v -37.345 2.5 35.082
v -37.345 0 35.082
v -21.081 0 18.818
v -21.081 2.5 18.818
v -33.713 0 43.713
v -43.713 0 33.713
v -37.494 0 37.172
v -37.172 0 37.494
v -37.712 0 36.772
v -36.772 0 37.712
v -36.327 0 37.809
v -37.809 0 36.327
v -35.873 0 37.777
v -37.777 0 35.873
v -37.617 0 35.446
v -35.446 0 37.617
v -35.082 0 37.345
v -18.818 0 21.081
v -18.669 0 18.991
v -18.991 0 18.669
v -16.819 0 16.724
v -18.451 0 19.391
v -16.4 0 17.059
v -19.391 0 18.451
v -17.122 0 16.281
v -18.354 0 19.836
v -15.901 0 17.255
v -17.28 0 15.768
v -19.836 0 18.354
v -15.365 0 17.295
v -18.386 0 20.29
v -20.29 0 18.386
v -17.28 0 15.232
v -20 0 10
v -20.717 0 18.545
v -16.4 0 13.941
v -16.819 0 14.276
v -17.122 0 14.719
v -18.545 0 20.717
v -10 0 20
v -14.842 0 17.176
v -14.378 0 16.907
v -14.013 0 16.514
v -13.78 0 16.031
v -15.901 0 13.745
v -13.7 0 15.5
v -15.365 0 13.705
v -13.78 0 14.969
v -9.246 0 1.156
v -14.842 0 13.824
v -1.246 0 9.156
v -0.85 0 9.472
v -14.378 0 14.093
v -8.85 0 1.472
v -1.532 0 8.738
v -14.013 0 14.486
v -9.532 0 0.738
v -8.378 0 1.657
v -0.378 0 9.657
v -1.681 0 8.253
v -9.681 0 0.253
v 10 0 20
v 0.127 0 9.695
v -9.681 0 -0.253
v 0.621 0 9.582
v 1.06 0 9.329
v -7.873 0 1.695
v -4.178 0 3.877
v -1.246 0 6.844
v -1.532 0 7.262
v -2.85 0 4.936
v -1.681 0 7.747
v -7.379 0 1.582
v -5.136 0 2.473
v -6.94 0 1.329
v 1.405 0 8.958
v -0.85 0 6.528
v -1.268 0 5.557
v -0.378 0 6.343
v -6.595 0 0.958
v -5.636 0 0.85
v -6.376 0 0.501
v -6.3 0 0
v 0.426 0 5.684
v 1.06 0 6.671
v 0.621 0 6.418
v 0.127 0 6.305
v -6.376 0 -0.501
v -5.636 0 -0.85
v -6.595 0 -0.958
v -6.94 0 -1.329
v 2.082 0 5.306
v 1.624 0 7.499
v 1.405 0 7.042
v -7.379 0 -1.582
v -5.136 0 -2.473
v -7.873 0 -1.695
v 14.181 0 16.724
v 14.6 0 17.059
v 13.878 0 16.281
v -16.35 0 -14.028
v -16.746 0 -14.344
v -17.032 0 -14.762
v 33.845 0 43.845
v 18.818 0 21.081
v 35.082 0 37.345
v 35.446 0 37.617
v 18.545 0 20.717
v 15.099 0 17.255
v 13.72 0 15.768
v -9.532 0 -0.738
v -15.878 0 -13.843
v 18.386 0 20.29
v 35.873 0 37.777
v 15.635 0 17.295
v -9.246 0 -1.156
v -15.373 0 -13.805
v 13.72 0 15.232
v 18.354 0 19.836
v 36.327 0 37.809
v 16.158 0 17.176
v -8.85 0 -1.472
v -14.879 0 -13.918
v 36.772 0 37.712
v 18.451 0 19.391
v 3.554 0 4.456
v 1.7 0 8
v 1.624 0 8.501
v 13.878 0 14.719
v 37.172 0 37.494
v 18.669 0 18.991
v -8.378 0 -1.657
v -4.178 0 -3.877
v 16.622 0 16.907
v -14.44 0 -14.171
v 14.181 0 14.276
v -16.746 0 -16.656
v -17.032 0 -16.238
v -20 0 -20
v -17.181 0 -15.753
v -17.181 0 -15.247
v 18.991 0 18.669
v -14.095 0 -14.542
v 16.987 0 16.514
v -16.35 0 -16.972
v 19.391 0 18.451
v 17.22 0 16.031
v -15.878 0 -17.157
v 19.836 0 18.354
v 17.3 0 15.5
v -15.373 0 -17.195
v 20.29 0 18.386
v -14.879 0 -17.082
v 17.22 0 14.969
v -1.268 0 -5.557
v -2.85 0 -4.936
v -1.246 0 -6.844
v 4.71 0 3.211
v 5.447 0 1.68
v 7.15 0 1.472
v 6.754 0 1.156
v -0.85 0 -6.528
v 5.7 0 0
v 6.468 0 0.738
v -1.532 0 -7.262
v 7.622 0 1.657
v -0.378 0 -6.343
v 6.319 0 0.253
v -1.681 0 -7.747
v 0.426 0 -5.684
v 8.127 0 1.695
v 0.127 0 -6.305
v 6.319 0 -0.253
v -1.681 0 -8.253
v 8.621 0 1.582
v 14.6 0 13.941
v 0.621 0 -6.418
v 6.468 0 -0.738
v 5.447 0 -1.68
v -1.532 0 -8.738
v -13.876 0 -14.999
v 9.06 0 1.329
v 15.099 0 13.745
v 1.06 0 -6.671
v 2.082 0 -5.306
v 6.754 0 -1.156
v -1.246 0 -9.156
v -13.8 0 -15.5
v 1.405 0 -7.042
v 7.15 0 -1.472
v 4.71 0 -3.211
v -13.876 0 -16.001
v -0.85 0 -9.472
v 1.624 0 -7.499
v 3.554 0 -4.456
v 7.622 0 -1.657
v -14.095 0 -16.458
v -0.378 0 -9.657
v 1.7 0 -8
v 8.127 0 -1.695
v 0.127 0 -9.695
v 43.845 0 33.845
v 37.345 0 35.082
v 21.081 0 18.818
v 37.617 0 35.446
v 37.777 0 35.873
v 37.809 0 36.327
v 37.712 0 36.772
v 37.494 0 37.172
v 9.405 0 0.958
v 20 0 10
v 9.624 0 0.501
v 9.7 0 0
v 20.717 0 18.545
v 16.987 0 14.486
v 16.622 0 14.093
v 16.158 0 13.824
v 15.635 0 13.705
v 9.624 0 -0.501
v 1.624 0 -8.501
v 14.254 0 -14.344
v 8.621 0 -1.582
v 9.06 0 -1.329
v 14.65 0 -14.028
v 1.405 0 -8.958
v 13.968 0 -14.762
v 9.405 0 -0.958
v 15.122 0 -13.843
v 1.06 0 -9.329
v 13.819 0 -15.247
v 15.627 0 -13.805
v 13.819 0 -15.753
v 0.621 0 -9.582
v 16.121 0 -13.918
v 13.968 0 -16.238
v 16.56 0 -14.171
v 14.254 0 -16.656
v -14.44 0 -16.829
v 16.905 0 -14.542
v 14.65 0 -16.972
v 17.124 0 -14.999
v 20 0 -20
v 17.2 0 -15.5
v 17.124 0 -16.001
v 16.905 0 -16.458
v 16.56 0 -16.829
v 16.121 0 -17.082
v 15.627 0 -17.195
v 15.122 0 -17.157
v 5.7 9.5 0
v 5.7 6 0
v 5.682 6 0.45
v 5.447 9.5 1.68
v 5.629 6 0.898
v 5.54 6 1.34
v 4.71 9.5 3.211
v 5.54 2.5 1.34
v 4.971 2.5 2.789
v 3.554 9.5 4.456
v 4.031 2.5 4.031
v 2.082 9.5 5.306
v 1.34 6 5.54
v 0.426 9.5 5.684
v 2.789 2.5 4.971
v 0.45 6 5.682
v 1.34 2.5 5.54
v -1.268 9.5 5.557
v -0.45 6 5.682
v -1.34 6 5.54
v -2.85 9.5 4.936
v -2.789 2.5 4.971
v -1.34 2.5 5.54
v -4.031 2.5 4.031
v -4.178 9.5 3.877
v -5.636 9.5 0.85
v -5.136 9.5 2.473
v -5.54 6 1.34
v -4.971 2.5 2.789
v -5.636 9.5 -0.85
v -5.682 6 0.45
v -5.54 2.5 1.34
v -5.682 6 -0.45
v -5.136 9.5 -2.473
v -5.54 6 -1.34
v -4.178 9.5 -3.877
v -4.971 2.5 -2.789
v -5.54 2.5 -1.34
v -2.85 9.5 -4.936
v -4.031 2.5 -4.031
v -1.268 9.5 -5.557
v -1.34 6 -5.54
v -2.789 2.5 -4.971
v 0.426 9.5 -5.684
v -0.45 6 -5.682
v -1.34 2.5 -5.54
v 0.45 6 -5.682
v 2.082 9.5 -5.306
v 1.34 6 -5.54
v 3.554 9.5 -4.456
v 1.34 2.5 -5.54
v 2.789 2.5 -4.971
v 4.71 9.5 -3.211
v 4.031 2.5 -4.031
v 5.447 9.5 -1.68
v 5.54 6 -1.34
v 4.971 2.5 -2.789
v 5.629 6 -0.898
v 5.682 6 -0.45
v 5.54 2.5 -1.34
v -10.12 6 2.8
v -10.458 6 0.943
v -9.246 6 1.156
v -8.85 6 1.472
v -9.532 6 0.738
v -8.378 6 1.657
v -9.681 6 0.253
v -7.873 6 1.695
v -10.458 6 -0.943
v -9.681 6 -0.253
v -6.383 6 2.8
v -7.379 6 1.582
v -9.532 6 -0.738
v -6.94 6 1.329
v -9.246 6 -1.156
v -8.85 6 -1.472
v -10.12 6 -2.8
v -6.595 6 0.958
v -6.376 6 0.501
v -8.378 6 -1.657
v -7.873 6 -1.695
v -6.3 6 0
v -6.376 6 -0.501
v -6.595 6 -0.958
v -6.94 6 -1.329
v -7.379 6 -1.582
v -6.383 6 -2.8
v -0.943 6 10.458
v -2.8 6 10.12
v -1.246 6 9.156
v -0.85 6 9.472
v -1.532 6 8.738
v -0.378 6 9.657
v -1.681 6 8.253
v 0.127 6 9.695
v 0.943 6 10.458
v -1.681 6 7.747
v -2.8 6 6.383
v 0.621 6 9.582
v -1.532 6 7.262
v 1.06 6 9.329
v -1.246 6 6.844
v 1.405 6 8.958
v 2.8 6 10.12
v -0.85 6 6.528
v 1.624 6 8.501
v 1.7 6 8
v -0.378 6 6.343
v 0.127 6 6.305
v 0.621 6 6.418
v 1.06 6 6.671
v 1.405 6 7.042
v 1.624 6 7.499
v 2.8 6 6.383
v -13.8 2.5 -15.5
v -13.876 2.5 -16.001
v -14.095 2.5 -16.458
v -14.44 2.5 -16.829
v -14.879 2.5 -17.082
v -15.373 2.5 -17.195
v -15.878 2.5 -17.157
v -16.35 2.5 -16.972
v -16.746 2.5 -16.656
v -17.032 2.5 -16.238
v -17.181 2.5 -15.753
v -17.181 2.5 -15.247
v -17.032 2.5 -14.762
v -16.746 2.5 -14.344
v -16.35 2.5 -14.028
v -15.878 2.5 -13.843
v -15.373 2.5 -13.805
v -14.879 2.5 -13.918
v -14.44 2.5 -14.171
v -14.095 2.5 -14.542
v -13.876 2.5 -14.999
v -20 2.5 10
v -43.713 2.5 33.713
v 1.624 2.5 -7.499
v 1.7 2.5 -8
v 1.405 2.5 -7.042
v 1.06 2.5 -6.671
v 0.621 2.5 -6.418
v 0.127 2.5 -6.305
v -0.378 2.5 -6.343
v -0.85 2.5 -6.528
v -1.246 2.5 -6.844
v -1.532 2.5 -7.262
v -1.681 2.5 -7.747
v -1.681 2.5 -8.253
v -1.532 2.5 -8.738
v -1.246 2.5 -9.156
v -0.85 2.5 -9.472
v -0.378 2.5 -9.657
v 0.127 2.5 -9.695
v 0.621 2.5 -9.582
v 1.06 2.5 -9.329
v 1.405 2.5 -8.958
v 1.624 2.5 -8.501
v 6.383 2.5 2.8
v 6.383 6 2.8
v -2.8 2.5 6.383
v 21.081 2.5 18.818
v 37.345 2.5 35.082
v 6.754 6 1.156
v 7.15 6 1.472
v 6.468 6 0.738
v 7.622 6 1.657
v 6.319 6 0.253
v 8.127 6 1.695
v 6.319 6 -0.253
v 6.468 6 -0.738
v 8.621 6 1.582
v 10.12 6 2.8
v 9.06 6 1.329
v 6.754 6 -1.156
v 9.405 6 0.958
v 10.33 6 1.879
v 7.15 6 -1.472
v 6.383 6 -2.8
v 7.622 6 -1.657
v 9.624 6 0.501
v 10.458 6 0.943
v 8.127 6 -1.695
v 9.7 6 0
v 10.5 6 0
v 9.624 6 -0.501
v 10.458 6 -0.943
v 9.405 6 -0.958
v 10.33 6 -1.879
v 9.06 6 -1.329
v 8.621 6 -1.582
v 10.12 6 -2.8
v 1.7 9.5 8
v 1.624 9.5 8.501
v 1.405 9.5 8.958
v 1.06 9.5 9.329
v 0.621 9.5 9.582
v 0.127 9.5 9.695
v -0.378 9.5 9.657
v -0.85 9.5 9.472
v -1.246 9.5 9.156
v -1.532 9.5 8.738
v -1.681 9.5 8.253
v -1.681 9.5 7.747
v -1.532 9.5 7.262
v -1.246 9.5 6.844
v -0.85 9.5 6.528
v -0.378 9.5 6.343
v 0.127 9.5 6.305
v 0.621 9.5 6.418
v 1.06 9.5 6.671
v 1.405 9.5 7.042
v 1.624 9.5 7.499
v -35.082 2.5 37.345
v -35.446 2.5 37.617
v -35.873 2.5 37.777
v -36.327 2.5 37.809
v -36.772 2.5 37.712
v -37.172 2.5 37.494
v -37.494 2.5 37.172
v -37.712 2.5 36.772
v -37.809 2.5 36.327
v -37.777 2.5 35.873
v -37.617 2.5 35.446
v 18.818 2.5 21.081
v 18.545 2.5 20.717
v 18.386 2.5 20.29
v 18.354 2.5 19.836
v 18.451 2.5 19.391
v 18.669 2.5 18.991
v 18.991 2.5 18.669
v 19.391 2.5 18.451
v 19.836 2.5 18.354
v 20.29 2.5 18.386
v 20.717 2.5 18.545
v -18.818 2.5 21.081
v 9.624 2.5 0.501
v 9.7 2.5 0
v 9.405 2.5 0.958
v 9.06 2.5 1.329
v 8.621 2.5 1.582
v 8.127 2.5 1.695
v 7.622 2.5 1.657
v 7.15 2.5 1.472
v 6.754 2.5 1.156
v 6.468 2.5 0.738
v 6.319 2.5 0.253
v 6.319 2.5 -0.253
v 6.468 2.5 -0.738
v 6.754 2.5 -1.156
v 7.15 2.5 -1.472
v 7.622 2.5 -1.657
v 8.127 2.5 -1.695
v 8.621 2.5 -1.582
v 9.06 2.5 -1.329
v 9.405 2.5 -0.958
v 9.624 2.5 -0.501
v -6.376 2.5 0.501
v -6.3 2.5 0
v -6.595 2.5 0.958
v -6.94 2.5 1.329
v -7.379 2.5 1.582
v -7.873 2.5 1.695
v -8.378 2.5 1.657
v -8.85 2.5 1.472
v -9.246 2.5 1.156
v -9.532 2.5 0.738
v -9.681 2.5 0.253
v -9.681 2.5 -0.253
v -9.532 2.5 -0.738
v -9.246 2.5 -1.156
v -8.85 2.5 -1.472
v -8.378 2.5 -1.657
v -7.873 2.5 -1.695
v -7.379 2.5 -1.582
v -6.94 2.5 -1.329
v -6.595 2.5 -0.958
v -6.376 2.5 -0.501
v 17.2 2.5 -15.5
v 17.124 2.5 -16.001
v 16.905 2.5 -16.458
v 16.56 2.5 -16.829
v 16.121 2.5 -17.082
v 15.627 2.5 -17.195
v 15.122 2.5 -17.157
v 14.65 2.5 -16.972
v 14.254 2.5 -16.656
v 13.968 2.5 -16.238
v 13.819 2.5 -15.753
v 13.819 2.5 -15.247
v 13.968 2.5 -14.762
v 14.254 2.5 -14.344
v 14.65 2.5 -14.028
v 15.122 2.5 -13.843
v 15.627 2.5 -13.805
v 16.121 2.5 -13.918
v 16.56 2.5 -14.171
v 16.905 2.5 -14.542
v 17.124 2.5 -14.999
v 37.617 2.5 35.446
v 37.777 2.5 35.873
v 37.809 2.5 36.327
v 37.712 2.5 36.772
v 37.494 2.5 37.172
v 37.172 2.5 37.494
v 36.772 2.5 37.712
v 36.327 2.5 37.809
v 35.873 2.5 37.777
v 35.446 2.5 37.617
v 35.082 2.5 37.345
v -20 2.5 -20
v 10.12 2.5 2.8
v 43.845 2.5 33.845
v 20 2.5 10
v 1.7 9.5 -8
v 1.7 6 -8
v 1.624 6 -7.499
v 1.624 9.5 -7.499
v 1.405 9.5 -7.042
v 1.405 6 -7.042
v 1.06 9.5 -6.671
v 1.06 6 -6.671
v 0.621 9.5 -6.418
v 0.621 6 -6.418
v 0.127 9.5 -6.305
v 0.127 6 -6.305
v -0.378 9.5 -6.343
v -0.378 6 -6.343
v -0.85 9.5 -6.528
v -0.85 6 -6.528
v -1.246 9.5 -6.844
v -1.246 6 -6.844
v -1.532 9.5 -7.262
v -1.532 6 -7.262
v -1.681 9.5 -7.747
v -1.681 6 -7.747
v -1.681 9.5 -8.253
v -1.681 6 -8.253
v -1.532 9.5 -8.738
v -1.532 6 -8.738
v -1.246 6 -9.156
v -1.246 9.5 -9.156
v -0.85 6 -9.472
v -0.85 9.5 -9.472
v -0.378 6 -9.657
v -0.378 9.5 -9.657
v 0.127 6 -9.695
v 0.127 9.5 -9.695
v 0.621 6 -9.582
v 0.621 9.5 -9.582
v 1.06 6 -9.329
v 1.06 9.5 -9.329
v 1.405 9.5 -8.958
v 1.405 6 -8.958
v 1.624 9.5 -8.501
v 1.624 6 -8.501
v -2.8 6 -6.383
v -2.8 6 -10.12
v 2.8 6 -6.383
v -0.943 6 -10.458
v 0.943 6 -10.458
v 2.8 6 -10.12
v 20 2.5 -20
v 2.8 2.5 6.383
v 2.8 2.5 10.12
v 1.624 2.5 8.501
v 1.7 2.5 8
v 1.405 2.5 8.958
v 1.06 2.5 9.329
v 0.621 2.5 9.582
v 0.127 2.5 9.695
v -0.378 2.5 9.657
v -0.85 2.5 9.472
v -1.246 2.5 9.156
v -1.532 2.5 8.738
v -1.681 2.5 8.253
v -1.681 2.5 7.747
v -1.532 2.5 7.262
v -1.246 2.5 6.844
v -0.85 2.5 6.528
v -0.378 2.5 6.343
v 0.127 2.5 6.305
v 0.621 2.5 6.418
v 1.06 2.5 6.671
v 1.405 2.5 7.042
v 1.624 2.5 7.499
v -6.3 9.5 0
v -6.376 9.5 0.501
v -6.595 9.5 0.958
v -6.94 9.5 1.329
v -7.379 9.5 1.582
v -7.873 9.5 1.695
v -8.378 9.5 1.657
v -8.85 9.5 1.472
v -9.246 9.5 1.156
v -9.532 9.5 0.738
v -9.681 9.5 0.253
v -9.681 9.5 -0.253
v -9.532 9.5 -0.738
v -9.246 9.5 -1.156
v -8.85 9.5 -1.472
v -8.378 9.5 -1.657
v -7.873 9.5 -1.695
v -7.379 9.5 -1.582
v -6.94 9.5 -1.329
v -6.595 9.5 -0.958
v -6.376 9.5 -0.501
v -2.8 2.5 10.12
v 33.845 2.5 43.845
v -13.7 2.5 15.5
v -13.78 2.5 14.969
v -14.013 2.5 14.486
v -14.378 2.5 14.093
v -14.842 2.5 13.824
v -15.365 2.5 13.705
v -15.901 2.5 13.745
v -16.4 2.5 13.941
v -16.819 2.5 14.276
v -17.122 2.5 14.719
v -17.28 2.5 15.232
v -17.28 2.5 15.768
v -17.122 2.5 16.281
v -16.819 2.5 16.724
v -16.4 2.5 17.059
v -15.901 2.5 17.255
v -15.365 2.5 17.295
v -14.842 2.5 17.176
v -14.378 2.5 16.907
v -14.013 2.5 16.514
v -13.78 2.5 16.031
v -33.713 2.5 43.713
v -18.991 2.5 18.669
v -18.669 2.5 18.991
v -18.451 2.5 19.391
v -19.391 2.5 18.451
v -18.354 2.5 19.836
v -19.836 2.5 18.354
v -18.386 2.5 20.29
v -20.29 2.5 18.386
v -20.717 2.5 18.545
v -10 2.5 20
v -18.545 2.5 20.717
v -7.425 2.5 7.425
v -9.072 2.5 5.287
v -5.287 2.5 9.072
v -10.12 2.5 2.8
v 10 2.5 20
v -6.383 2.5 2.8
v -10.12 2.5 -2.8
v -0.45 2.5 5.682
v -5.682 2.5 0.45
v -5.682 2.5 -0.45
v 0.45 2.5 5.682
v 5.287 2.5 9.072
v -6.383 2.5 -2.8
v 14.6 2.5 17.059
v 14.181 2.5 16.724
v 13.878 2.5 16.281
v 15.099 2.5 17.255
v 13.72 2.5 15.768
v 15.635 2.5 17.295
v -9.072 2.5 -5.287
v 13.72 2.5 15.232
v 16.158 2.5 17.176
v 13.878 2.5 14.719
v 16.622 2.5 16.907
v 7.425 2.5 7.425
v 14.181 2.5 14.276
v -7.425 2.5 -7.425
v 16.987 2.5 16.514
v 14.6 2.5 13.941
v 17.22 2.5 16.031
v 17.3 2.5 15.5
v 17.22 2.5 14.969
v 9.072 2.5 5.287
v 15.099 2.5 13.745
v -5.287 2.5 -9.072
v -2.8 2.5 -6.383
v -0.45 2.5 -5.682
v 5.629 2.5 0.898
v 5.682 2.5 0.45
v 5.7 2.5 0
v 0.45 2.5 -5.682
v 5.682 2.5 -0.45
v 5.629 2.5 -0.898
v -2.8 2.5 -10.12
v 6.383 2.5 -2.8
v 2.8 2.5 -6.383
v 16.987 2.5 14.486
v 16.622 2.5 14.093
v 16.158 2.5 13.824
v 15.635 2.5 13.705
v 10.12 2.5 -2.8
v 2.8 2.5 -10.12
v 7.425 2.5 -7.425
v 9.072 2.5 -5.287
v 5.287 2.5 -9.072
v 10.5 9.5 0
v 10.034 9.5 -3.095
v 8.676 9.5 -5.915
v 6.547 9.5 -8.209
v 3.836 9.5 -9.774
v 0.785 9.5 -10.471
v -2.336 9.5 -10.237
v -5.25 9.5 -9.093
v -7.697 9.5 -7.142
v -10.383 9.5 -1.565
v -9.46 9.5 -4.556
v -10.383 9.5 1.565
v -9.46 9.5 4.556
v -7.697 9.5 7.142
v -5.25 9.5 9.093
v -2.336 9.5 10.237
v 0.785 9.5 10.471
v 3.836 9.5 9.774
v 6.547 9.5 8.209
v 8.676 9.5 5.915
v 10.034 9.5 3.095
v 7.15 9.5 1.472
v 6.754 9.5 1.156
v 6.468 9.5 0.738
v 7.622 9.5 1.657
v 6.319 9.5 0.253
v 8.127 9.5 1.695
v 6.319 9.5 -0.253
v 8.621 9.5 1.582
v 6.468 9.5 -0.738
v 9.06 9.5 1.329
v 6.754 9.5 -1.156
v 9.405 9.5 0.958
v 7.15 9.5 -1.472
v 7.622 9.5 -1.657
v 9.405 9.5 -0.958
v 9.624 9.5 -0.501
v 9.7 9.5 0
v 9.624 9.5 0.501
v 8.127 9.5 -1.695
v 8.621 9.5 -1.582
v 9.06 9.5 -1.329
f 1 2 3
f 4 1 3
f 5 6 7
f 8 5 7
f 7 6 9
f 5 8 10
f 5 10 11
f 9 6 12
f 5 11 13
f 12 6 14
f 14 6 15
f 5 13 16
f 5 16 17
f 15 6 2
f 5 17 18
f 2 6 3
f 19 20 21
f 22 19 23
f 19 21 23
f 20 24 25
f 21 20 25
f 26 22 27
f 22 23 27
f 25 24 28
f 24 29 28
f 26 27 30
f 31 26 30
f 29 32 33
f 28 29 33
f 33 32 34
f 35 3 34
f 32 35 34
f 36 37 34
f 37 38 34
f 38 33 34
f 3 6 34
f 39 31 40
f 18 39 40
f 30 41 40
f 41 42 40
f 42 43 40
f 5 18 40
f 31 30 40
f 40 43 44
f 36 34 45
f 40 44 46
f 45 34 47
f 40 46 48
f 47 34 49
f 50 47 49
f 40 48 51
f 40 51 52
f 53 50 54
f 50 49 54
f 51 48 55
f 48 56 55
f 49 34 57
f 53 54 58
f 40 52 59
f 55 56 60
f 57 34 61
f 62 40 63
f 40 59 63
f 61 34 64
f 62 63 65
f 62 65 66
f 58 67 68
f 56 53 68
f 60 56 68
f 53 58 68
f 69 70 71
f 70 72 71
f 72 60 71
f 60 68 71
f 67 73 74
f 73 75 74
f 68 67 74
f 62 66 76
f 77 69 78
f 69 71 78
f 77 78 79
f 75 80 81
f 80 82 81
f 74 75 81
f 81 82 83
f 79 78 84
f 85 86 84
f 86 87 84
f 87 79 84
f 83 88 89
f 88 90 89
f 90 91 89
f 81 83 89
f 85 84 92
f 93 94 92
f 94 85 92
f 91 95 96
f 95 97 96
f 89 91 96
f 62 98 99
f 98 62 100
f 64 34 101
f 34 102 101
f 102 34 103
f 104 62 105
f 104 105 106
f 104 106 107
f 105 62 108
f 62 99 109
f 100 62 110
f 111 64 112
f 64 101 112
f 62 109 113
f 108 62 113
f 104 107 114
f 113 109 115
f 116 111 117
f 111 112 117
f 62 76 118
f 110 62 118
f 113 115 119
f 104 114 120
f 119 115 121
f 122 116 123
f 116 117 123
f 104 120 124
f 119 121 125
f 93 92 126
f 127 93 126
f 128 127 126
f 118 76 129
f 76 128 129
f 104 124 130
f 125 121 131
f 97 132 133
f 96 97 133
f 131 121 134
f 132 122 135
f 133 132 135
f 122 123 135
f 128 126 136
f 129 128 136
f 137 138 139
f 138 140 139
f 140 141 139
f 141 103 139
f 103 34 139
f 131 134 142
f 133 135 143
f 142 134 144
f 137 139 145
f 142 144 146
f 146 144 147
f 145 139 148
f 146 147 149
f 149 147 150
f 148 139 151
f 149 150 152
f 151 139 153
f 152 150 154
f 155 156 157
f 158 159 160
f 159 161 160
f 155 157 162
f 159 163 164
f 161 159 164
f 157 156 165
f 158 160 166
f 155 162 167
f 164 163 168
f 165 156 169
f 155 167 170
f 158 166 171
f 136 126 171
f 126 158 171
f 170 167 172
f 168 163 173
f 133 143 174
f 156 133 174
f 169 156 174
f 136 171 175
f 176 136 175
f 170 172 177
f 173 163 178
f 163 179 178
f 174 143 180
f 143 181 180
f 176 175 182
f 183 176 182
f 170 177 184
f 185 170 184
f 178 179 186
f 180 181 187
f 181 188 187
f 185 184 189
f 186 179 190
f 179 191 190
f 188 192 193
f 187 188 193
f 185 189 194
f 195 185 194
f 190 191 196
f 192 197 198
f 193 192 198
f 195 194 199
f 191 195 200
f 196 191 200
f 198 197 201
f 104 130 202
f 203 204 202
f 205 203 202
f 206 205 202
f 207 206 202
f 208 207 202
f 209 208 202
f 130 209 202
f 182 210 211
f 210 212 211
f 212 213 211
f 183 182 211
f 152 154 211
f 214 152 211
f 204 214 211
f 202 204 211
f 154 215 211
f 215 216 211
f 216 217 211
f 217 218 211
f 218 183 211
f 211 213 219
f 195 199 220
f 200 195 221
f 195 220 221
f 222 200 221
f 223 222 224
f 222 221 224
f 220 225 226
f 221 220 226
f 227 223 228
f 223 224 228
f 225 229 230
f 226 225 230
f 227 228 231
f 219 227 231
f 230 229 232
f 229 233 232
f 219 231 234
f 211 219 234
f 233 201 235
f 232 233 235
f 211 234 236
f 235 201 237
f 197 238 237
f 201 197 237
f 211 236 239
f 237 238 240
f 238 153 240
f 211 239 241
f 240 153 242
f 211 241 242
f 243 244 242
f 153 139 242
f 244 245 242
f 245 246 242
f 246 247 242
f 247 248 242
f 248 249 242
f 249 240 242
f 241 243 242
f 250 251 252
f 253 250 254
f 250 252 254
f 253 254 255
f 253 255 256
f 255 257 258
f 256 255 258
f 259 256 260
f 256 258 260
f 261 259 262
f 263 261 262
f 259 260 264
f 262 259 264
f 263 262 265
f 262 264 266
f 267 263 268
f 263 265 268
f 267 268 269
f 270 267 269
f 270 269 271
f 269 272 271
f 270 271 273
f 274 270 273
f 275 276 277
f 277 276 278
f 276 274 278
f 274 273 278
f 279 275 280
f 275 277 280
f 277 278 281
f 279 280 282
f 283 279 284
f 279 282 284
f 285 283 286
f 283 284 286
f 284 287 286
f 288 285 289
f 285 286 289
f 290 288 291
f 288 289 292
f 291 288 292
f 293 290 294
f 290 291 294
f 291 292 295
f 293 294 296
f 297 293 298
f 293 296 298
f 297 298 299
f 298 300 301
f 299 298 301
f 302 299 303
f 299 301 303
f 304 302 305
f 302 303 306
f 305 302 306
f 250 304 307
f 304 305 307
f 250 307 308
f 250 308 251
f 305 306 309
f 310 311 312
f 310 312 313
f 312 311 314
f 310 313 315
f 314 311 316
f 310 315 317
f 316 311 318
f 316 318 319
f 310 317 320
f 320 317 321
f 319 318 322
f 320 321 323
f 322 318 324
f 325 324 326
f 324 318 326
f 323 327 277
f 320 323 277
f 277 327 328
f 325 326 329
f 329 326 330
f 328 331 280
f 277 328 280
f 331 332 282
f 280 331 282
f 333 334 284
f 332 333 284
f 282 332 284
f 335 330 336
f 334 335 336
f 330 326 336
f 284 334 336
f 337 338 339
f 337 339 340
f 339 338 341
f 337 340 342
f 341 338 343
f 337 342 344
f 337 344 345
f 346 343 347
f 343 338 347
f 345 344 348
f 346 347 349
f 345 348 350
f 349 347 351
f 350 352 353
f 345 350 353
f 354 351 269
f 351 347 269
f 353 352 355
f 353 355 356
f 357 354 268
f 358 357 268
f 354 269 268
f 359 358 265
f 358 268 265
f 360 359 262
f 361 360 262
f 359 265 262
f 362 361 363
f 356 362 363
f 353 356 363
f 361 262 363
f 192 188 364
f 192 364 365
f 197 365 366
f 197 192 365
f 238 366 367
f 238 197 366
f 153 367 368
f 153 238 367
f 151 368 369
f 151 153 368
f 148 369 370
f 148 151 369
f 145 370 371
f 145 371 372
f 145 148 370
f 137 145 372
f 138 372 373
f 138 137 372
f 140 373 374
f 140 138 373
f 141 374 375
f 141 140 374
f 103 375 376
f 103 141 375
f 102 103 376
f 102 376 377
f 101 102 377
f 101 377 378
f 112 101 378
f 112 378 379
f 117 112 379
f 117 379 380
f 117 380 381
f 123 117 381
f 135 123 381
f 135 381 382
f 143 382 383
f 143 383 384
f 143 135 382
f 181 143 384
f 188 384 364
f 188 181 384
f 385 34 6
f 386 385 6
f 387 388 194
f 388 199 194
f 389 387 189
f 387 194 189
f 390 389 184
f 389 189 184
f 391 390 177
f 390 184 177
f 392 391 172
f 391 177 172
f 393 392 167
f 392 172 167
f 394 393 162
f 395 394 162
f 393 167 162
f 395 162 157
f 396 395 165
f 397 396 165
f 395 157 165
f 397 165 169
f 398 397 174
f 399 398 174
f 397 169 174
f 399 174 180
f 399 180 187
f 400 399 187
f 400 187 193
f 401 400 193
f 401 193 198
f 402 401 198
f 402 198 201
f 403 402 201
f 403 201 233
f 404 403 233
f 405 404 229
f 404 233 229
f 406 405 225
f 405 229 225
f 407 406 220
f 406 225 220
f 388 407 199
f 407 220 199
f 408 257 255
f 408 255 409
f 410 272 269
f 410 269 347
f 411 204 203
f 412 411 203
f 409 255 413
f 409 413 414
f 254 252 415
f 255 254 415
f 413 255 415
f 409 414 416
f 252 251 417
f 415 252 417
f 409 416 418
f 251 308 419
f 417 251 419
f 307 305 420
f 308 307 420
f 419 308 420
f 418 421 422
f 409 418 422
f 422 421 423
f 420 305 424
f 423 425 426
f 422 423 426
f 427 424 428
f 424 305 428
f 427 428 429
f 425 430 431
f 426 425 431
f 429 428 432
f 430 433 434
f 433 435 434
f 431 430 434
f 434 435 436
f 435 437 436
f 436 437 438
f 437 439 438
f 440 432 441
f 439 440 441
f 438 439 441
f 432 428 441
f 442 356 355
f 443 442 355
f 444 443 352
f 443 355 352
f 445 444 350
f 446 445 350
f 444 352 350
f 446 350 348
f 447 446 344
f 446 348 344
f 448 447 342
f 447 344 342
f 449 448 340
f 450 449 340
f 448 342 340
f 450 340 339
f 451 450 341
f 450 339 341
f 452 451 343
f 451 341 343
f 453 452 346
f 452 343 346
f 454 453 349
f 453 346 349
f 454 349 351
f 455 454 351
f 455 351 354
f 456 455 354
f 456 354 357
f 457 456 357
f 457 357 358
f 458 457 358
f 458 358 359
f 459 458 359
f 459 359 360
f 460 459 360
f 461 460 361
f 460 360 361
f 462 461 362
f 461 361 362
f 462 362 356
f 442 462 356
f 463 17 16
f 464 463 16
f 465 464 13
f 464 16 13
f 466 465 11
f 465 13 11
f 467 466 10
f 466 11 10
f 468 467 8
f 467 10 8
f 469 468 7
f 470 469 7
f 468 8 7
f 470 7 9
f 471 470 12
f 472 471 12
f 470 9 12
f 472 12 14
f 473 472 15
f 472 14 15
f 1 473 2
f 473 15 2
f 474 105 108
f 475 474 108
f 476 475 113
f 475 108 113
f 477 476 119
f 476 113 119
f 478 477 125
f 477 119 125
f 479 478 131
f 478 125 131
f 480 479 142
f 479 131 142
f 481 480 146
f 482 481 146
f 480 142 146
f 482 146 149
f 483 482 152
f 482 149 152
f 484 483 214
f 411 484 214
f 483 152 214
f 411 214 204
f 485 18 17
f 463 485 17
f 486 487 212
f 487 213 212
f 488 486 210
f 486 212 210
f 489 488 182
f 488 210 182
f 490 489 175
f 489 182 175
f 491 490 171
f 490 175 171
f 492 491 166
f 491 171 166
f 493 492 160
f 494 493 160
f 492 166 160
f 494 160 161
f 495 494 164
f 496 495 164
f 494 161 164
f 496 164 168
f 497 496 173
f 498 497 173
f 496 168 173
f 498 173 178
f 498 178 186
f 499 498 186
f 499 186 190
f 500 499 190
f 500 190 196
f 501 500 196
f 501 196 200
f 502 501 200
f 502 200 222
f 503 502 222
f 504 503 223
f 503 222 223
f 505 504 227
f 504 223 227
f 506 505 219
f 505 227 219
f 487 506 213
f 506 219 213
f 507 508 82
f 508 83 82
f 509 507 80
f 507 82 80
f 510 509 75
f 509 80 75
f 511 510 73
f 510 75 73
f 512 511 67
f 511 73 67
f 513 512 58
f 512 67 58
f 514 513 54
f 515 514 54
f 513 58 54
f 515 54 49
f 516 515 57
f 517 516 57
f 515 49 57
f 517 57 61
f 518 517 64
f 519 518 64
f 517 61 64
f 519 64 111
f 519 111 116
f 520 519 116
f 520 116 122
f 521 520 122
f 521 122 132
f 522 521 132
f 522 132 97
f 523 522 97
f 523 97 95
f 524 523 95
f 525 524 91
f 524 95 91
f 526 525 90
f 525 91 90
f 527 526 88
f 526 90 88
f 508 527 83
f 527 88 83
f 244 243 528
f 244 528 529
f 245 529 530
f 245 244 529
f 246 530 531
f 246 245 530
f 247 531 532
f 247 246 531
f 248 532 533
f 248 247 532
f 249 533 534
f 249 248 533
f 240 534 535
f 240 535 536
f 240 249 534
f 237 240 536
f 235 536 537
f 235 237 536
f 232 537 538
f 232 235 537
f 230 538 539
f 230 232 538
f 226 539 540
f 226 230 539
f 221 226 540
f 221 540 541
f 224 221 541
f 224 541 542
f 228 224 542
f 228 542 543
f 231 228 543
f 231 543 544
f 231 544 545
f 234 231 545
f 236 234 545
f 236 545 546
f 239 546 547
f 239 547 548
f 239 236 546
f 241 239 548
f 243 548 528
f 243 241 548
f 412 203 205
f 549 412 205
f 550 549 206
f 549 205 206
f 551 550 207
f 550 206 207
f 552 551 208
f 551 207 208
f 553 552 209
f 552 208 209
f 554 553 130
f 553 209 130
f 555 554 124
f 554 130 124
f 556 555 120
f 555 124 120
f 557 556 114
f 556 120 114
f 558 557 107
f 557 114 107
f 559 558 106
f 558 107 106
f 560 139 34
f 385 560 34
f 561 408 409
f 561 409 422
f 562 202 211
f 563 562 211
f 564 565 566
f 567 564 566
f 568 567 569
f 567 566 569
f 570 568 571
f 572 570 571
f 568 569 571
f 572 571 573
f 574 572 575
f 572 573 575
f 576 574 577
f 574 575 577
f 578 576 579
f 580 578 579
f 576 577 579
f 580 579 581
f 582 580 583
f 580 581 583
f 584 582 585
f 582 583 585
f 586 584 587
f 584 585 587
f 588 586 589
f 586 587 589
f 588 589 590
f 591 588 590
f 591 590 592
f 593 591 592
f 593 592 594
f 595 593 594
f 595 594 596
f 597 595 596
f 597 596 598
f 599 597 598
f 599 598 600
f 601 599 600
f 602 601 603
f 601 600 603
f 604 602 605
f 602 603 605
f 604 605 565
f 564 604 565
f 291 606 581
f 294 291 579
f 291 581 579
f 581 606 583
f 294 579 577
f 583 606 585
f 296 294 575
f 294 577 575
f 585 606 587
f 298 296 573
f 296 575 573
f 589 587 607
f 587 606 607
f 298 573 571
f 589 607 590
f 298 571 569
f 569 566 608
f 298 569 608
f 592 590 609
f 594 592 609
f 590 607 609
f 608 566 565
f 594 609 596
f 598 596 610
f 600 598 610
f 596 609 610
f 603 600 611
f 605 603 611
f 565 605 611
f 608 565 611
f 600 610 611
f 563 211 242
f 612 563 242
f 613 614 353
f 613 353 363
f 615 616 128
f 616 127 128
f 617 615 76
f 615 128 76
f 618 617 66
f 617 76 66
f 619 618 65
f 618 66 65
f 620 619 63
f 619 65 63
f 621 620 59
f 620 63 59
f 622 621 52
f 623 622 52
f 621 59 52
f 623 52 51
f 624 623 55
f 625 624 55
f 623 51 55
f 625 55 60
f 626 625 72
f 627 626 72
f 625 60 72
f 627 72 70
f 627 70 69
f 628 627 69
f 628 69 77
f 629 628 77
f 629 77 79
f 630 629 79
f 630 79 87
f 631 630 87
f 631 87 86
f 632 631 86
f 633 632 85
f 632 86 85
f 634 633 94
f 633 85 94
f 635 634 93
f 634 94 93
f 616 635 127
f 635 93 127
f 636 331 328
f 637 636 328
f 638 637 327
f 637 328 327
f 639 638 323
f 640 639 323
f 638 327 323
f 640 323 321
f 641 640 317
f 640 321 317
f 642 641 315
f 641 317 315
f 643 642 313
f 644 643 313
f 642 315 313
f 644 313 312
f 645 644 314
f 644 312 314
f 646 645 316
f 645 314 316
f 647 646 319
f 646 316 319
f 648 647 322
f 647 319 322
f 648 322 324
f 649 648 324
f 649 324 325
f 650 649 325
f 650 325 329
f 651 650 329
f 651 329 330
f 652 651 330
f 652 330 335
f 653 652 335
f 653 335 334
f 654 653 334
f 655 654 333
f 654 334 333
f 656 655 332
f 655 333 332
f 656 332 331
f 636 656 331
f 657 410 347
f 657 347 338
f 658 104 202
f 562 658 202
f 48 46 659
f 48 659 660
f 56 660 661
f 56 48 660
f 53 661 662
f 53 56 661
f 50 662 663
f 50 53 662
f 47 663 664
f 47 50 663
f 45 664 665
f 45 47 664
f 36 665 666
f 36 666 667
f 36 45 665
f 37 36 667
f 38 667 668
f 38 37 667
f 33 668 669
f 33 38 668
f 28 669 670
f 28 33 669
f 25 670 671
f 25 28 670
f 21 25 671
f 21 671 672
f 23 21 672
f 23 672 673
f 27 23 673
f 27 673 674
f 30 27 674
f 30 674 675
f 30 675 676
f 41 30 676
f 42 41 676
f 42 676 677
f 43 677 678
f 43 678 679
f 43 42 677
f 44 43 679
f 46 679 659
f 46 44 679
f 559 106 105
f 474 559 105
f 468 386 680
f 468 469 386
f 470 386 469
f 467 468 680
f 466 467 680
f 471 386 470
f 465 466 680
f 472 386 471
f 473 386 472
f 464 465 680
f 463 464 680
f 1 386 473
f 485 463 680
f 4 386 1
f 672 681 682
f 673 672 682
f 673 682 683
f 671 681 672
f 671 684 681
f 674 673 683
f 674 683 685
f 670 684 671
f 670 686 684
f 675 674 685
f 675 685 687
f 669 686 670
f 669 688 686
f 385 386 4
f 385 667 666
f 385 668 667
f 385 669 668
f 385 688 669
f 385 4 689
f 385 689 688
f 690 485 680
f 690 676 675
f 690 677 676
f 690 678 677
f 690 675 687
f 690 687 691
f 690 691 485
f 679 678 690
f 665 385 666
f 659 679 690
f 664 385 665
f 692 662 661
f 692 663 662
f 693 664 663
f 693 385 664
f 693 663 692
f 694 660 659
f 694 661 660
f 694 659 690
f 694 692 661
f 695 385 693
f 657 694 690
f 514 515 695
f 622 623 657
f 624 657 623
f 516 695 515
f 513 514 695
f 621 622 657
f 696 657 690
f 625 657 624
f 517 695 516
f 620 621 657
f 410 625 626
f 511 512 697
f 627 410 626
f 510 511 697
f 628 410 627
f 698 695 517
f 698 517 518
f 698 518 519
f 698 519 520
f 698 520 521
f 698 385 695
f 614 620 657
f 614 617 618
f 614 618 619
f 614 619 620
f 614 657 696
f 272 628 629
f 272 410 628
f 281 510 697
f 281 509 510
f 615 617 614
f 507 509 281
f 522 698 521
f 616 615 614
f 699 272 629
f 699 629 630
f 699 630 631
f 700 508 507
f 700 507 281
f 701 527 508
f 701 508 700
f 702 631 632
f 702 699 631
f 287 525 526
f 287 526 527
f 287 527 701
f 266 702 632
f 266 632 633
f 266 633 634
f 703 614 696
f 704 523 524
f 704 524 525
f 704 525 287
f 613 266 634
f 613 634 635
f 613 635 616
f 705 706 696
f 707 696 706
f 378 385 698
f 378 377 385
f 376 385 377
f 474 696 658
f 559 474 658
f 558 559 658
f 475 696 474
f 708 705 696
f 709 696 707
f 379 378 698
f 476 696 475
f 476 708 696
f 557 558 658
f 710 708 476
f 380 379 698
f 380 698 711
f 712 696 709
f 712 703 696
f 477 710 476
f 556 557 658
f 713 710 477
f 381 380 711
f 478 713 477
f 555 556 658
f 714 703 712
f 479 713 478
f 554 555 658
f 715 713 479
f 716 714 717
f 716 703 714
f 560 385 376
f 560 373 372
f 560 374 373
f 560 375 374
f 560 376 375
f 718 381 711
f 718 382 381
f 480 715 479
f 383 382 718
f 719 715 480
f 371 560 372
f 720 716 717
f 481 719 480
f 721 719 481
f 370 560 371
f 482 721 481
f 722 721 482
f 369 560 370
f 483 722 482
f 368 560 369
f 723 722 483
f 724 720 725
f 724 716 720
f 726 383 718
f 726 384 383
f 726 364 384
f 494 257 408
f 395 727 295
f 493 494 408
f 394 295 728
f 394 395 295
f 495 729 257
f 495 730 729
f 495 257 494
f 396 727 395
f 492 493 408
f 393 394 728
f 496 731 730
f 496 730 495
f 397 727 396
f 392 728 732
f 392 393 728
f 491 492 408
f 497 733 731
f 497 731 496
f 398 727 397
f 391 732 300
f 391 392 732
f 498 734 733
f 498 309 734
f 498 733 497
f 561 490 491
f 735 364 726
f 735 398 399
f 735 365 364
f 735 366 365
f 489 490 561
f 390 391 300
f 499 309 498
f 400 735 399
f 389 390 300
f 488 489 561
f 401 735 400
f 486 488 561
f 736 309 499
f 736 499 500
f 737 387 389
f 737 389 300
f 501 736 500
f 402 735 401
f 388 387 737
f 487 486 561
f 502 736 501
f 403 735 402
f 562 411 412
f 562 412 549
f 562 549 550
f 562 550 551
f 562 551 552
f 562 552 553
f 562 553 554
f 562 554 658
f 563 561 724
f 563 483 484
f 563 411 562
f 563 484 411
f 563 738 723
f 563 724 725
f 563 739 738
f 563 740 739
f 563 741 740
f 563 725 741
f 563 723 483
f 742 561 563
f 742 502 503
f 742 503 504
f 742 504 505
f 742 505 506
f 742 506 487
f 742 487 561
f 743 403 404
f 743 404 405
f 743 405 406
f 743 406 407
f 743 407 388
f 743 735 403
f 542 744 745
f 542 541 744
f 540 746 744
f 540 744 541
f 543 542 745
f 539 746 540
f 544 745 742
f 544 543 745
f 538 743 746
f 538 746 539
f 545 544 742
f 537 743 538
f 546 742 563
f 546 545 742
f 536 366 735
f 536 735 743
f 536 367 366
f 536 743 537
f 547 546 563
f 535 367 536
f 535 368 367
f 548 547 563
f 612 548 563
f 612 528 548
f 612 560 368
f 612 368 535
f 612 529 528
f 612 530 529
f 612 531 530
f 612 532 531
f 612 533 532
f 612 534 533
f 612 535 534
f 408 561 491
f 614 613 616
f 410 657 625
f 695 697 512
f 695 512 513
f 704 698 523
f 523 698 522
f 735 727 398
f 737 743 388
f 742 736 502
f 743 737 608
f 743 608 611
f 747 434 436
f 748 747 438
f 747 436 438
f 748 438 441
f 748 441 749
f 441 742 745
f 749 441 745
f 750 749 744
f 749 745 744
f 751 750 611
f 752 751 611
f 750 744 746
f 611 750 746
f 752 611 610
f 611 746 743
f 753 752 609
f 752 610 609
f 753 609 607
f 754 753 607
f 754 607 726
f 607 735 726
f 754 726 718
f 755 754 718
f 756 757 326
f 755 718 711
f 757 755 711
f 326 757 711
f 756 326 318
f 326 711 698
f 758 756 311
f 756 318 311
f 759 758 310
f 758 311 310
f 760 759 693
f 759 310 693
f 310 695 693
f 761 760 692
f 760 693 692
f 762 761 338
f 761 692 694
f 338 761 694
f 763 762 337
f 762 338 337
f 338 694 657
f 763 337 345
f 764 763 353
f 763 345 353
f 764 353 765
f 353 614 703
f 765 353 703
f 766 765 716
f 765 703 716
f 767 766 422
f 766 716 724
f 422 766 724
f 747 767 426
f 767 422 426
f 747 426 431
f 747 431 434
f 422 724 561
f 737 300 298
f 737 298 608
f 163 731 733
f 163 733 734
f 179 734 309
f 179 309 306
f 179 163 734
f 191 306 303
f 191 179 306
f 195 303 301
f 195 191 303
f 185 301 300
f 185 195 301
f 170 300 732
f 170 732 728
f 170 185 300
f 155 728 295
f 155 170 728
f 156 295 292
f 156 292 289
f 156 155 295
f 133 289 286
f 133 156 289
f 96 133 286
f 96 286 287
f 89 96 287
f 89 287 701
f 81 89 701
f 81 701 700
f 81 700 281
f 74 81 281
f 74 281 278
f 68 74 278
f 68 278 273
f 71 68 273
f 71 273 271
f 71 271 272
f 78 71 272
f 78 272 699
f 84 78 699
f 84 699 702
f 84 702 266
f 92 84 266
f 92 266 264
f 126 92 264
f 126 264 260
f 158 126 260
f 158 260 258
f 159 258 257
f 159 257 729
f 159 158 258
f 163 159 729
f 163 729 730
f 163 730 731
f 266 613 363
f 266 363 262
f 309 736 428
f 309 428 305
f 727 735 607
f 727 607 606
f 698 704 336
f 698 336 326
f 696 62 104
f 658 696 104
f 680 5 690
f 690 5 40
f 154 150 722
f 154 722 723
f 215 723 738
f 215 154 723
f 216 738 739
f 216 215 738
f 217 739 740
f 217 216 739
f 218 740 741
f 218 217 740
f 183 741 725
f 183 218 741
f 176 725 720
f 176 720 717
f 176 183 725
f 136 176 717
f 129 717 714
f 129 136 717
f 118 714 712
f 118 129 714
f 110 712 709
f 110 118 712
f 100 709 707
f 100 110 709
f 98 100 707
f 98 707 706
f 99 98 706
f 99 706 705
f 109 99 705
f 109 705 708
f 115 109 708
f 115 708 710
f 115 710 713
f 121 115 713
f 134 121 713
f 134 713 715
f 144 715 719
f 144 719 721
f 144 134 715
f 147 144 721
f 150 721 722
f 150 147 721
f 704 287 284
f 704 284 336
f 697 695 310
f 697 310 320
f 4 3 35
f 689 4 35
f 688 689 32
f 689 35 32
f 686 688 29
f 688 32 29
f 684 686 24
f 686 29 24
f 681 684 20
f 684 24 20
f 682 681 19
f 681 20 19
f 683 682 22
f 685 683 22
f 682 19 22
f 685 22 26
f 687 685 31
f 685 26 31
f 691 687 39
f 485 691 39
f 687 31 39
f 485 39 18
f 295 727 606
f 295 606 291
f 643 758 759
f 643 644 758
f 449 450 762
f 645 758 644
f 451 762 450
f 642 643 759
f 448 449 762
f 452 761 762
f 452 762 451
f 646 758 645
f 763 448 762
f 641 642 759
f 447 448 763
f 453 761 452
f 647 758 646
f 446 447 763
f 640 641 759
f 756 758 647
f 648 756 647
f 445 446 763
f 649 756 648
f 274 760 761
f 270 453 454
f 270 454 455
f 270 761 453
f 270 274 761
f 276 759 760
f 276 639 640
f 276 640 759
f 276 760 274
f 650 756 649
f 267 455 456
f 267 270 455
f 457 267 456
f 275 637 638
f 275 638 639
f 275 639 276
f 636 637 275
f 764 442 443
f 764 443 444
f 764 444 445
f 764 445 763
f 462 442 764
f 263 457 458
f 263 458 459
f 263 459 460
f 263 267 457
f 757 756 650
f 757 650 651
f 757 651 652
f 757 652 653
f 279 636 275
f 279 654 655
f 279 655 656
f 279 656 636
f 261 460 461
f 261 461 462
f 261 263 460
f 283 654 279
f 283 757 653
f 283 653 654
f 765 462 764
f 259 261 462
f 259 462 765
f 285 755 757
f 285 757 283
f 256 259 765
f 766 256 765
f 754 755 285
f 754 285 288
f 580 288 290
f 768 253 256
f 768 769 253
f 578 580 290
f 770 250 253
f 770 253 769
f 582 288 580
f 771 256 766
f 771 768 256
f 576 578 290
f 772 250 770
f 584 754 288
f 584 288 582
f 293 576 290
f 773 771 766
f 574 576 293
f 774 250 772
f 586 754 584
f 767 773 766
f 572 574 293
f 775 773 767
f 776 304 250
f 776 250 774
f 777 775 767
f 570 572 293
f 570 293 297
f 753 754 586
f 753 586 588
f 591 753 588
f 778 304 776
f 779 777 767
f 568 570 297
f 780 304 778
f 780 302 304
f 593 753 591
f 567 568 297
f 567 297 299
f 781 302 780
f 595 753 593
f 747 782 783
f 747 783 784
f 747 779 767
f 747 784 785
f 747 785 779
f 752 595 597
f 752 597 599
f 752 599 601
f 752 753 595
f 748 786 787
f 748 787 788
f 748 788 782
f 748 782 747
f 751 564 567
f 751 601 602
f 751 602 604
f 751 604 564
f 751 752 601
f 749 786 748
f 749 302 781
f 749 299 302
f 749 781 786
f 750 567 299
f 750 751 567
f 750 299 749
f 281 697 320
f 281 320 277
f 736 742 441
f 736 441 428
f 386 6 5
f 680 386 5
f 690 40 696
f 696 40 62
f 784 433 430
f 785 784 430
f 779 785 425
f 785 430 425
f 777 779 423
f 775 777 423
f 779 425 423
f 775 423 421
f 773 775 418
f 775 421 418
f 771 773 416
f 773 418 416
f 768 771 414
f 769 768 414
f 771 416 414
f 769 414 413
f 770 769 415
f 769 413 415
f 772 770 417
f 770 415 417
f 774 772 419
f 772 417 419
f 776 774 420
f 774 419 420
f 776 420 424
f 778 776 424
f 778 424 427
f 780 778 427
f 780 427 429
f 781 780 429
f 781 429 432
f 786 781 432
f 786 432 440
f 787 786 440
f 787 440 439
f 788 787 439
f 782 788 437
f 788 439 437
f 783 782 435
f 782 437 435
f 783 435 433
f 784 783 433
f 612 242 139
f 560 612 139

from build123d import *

# Parameters (mm, degrees)
SKETCH_1_R          = 1.7
SKETCH_1_R_2        = 1.8
SKETCH_1_R_3        = 5.7
EXTRUDE_1_DEPTH     = 2.5
SKETCH_2_R          = 10.5
EXTRUDE_2_DEPTH     = 7
SKETCH_4_R          = 1.7
CUT_EXTRUDE_1_DEPTH = 7
CUT_EXTRUDE_2_DEPTH = 3.5
SKETCH_6_R          = 5.7
CUT_EXTRUDE_3_DEPTH = 20


with BuildPart() as part:
    # 草图1 → 凸台-拉伸1 (new body)
    with BuildSketch(Plane(origin=(0, 0, 0), x_dir=(1, 0, 0), z_dir=(0, 1, 0))):
        Polygon((-10, -20), (10, -20), (33.844622395, -43.844622395), (43.844622395, -33.844622395), (20, -10), (20, 20), (-20, 20), (-20, -10), (-43.713203436, -33.713203436), (-33.713203436, -43.713203436), align=None)
        with Locations((-15.5, 15.5)):
            Circle(SKETCH_1_R, mode=Mode.SUBTRACT)
        with Locations((15.5, 15.5)):
            Circle(SKETCH_1_R, mode=Mode.SUBTRACT)
        with Locations((-15.5, -15.5)):
            Circle(SKETCH_1_R_2, mode=Mode.SUBTRACT)
        with Locations((15.5, -15.5)):
            Circle(SKETCH_1_R_2, mode=Mode.SUBTRACT)
        Circle(SKETCH_1_R_3, mode=Mode.SUBTRACT)
        with Locations((-8, 0)):
            Circle(SKETCH_1_R, mode=Mode.SUBTRACT)
        with Locations((0, 8)):
            Circle(SKETCH_1_R, mode=Mode.SUBTRACT)
        with Locations((8, 0)):
            Circle(SKETCH_1_R, mode=Mode.SUBTRACT)
        with Locations((0, -8)):
            Circle(SKETCH_1_R, mode=Mode.SUBTRACT)
        with BuildLine():
            Line((-18.818376618, -21.081118318), (-35.081832586, -37.344574285))
            ThreePointArc((-35.081832586, -37.344574285), (-37.344574285, -37.344574285), (-37.344574285, -35.081832586))
            Line((-37.344574285, -35.081832586), (-21.081118318, -18.818376618))
            ThreePointArc((-21.081118318, -18.818376618), (-18.818376618, -18.818376618), (-18.818376618, -21.081118318))
        make_face(mode=Mode.SUBTRACT)
        with BuildLine():
            Line((21.081118316, -18.818376616), (37.344574284, -35.081832584))
            ThreePointArc((37.344574284, -35.081832584), (37.344574284, -37.344574284), (35.081832584, -37.344574284))
            Line((35.081832584, -37.344574284), (18.818376616, -21.081118316))
            ThreePointArc((18.818376616, -21.081118316), (18.818376616, -18.818376616), (21.081118316, -18.818376616))
        make_face(mode=Mode.SUBTRACT)
    extrude(amount=EXTRUDE_1_DEPTH)

    # 草图2 → 凸台-拉伸2 (add)
    with BuildSketch(Plane(origin=(0, 2.5, 0), x_dir=(1, 0, 0), z_dir=(0, 1, 0))):
        Circle(SKETCH_2_R)
    extrude(amount=EXTRUDE_2_DEPTH)

    # 草图4 → 切除-拉伸1 (cut)
    with BuildSketch(Plane.XZ.offset(-2.5)):
        with Locations((0, -8)):
            Circle(SKETCH_4_R)
        with Locations((-8, 0)):
            Circle(SKETCH_4_R)
        with Locations((8, 0)):
            Circle(SKETCH_4_R)
        with Locations((0, 8)):
            Circle(SKETCH_4_R)
    extrude(amount=-CUT_EXTRUDE_1_DEPTH, mode=Mode.SUBTRACT)

    # 草图5 → 切除-拉伸2 (cut)
    with BuildSketch(Plane(origin=(0, 2.5, 0), x_dir=(1, 0, 0), z_dir=(0, 1, 0))):
        Polygon((-4.766838493, 0), (-6.383419246, 2.8), (-11.233161507, 2.8), (-11.233161507, -2.8), (-6.383419246, -2.8), align=None)
        Polygon((4.766838493, 0), (6.383419246, -2.8), (11.233161507, -2.8), (11.233161507, 2.8), (6.383419246, 2.8), align=None)
        Polygon((-2.8, 11.233161507), (-2.8, 6.383419246), (0, 4.766838493), (2.8, 6.383419246), (2.8, 11.233161507), align=None)
        Polygon((0, -4.766838493), (-2.8, -6.383419246), (-2.8, -11.233161507), (2.8, -11.233161507), (2.8, -6.383419246), align=None)
    extrude(amount=CUT_EXTRUDE_2_DEPTH, mode=Mode.SUBTRACT)

    # 草图6 → 切除-拉伸3 (cut)
    with BuildSketch(Plane.XZ.offset(-2.5)):
        Circle(SKETCH_6_R)
    extrude(amount=-CUT_EXTRUDE_3_DEPTH, mode=Mode.SUBTRACT)


solid = part.part
